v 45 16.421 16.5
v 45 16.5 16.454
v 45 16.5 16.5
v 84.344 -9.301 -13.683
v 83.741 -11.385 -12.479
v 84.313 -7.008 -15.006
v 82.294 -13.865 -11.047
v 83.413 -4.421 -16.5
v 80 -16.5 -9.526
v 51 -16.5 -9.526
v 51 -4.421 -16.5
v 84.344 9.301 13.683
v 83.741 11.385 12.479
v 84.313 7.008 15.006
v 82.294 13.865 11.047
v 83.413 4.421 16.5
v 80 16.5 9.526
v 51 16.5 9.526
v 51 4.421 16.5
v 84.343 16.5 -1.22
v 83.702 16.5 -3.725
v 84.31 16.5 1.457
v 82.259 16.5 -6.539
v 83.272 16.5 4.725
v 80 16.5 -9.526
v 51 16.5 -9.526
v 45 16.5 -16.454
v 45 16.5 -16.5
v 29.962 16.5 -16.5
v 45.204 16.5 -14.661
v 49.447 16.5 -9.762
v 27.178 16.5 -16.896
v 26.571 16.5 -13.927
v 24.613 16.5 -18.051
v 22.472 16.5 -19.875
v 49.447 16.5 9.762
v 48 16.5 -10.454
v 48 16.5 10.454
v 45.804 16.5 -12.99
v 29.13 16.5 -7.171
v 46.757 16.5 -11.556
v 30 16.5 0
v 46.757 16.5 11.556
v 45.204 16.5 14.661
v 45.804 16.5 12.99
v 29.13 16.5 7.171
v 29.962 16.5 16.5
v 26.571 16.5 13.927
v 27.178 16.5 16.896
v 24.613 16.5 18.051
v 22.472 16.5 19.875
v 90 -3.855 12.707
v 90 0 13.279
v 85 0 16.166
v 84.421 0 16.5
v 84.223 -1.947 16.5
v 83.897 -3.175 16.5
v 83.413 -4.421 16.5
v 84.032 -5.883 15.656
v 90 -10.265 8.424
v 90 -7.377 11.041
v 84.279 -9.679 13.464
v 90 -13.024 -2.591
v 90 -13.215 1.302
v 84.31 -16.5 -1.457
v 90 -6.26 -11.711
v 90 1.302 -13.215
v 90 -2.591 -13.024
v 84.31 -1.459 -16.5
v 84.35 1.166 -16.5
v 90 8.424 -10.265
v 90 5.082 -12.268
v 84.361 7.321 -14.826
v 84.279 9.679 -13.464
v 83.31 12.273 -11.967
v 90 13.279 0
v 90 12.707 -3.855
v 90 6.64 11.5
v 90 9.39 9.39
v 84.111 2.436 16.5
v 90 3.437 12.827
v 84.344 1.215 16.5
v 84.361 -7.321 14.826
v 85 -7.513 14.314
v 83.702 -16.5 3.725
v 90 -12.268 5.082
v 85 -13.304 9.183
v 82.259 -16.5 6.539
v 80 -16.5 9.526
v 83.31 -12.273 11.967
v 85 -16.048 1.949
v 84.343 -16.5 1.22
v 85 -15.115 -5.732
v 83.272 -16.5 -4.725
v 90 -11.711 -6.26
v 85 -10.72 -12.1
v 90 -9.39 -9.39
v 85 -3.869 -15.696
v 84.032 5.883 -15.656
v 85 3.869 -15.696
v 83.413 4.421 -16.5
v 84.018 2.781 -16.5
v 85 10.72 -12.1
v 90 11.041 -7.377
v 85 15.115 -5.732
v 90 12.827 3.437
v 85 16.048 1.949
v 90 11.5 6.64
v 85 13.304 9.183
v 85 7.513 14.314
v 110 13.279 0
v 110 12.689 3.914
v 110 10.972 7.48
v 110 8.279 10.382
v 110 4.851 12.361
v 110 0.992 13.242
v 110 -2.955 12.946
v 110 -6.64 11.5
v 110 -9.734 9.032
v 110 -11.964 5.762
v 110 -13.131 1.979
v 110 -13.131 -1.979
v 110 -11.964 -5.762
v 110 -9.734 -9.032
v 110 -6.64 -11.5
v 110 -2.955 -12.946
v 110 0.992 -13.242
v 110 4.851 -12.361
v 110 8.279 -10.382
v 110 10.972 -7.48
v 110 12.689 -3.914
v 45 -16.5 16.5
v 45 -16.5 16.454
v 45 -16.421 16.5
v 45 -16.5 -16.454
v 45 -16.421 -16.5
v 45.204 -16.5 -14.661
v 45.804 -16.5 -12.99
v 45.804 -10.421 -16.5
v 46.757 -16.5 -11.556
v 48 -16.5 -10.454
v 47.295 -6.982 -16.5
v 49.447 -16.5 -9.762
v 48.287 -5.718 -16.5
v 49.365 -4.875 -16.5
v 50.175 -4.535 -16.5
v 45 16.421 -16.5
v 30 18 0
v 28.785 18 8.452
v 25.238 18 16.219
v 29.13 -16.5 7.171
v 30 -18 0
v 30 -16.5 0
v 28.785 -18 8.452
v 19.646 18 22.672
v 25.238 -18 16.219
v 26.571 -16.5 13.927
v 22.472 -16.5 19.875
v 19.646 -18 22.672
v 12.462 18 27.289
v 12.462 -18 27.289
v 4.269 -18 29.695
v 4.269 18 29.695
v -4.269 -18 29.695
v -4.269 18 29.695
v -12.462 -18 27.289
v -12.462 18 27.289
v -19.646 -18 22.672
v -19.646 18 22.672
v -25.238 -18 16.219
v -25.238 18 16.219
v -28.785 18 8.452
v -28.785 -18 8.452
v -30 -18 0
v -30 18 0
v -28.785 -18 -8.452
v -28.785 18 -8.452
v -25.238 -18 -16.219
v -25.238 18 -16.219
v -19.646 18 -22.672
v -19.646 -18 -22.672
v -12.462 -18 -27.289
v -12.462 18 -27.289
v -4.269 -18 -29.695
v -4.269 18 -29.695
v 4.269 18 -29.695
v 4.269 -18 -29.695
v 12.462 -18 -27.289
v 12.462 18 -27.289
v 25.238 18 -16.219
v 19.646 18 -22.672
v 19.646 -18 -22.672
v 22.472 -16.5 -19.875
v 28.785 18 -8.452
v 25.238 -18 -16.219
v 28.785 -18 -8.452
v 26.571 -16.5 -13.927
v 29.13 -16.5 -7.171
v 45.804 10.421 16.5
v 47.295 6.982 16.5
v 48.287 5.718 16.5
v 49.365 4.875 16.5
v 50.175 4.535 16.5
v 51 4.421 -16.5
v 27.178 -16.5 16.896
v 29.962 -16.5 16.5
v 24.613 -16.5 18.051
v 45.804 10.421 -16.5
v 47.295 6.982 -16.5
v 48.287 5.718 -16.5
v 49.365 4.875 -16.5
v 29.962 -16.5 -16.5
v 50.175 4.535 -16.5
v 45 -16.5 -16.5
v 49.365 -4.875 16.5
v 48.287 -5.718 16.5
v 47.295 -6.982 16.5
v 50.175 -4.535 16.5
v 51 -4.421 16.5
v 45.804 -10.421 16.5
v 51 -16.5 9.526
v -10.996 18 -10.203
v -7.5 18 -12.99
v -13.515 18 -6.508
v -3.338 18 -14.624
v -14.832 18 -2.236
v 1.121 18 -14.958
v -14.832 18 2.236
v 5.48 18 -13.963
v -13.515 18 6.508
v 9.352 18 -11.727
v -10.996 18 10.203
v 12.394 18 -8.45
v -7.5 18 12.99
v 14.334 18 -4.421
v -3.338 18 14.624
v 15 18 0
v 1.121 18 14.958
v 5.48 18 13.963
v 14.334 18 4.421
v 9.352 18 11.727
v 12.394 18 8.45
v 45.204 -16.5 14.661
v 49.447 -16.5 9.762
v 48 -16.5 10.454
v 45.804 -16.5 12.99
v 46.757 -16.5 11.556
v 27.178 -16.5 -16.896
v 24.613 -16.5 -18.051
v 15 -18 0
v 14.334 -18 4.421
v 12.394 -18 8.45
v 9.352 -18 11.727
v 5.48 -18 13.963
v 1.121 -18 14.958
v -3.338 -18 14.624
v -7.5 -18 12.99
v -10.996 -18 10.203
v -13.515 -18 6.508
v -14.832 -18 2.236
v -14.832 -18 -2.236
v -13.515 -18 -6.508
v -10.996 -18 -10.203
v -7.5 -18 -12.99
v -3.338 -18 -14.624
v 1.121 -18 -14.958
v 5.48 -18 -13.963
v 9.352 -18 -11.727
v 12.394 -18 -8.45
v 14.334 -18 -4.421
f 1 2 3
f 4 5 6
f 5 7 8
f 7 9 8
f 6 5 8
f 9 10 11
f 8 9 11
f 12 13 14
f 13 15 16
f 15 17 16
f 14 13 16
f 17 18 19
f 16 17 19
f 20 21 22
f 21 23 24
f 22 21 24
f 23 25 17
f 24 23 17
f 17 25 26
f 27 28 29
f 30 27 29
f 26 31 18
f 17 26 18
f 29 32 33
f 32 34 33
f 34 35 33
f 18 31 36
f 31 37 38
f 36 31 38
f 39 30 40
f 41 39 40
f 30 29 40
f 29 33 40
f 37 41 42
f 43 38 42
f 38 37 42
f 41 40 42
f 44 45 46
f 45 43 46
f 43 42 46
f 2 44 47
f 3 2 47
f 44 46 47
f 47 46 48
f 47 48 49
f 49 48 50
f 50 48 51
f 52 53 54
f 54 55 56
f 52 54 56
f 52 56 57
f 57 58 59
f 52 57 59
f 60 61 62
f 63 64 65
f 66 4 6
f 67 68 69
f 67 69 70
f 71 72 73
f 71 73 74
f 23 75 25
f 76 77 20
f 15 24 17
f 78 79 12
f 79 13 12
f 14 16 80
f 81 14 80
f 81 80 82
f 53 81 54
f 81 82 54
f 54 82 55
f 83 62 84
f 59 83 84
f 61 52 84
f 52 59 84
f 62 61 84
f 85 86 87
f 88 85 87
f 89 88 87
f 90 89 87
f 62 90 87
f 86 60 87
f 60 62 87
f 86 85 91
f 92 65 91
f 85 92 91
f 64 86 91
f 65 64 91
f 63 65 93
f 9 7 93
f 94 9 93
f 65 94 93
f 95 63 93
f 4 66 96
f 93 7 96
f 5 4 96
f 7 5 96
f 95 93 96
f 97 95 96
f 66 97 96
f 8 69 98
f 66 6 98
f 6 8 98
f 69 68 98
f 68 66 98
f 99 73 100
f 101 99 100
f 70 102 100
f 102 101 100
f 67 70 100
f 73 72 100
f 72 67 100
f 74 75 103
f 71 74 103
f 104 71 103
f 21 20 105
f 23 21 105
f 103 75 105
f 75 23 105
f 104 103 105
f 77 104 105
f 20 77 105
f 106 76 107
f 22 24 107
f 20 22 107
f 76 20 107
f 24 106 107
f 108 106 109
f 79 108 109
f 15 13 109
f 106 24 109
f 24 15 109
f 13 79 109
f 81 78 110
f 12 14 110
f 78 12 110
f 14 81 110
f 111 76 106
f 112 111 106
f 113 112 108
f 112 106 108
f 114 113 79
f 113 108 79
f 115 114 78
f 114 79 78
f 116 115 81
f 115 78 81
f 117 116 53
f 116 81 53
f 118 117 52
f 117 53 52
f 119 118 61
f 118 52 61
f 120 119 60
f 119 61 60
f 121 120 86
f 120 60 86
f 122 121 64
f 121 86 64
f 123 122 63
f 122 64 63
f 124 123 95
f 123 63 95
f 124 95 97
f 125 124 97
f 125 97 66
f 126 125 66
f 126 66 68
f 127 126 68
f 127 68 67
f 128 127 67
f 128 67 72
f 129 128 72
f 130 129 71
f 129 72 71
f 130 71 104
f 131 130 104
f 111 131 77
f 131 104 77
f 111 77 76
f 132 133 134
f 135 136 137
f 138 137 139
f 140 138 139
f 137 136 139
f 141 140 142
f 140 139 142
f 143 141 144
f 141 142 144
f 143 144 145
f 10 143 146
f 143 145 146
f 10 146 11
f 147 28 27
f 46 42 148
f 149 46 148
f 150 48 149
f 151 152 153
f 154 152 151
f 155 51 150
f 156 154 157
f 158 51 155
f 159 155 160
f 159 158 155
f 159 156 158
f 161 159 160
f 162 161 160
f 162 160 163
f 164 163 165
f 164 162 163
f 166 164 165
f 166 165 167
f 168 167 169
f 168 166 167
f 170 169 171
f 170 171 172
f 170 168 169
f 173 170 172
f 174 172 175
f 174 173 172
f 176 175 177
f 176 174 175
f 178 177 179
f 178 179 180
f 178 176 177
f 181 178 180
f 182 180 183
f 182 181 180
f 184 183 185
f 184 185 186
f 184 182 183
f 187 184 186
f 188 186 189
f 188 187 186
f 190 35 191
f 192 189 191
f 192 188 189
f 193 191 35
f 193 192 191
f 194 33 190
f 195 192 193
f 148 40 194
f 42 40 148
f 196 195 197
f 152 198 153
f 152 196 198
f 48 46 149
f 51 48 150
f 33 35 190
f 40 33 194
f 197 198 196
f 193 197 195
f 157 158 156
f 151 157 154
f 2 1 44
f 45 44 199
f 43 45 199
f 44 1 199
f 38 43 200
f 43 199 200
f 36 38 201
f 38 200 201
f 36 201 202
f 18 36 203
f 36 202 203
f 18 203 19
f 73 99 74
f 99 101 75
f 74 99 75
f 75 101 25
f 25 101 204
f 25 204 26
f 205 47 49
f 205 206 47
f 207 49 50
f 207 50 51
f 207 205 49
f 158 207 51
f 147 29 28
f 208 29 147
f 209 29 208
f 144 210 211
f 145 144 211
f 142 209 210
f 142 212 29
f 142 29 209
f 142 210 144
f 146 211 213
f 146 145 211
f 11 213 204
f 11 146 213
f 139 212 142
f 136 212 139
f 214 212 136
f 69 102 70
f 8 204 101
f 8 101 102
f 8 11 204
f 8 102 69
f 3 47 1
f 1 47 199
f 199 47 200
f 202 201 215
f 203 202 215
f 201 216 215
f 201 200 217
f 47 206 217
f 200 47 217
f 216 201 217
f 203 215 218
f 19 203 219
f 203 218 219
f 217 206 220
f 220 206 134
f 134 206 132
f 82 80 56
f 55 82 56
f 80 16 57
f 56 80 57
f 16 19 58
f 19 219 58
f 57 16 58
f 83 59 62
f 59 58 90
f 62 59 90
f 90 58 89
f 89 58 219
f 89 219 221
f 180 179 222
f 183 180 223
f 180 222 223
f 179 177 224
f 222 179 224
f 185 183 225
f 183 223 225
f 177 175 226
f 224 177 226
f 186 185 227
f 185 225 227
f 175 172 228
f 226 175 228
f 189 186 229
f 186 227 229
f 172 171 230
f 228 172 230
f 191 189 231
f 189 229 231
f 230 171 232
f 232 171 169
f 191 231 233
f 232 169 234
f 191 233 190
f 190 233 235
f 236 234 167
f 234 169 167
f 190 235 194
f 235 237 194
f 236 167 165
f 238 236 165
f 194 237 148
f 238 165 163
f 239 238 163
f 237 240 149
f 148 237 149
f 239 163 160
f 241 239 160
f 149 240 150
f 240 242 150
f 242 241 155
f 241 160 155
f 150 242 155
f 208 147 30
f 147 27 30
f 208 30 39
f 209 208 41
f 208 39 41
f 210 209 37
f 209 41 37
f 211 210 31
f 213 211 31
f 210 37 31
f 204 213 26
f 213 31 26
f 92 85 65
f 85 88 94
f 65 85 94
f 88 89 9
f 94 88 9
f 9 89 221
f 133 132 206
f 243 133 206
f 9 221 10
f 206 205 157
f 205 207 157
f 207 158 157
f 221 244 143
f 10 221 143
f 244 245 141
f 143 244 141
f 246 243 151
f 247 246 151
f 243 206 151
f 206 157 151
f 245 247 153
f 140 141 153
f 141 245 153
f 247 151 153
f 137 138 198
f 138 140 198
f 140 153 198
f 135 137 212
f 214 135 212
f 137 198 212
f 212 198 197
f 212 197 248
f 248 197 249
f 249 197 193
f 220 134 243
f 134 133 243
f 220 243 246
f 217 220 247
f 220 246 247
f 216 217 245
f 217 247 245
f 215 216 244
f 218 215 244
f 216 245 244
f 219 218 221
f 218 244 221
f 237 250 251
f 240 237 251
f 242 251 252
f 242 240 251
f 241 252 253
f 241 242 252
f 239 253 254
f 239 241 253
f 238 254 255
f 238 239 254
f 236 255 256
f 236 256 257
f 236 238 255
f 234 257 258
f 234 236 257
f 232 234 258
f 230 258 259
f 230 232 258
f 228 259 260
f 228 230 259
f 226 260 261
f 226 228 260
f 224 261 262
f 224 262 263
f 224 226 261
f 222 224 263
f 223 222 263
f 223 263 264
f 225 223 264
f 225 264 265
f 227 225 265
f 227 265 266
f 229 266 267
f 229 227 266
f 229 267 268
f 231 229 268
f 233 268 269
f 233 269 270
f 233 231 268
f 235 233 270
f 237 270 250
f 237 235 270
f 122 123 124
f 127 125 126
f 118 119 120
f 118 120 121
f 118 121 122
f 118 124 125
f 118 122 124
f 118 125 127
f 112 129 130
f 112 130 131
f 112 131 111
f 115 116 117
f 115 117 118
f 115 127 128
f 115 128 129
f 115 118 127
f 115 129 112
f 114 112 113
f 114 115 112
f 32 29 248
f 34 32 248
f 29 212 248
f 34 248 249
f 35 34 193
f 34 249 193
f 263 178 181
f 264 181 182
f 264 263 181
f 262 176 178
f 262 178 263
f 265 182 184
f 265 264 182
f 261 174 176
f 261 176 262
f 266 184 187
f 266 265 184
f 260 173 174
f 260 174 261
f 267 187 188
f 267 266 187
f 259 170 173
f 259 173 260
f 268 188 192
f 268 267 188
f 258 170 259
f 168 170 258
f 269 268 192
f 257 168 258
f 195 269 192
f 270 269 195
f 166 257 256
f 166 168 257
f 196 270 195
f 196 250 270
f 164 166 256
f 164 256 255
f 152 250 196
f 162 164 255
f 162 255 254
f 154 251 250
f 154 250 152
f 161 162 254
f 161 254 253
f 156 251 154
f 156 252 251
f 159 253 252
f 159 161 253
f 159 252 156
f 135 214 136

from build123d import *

# Parameters (mm, degrees)
F0_R      = 30
F0_R_2    = 15
F1_DEPTH  = 18
F2_W      = 20
F2_H      = 33
F3_DEPTH  = 16.5
F5_DEPTH  = 45
F9_DEPTH  = 45.001
F10_DEPTH = 45.001
F11_R     = 6
F12_R     = 13.2790561914
F13_DEPTH = 20
F14_R     = 10


with BuildPart() as f1:
    # F0 (on Front) → F1 (new body, symmetric)
    with BuildSketch(Plane.XZ):
        Circle(F0_R)
        Circle(F0_R_2, mode=Mode.SUBTRACT)
    extrude(amount=F1_DEPTH, both=True)

    # F2 (on Front) → F3 (join, symmetric)
    with BuildSketch(Plane.XZ):
        with Locations((35, 0)):
            Rectangle(F2_W, F2_H)
    extrude(amount=F3_DEPTH, both=True)

    # F4 (on face) → F5 (join)
    with BuildSketch(Plane.YZ.offset(45)):
        Polygon((-16.5, 9.5262794416), (-16.5, -9.5262794416), (0, -19.0525588833), (16.5, -9.5262794416), (16.5, 9.5262794416), (0, 19.0525588833), align=None)
    extrude(amount=F5_DEPTH)

    # F7 (on mid) → F8 (revolve, cut)
    with BuildSketch(Plane(origin=(0, 0, 0), x_dir=(-1, 0, 0), z_dir=(0, 1, 0))):
        Polygon((-90, 19.0525588833), (-90, 13.2790561914), (-80, 19.0525588833), align=None)
    revolve(axis=Axis((76.7741315067, 0, 0), (1, 0, 0)), mode=Mode.SUBTRACT)

    # F9 (cut, through all): a face of the model
    f9_faces = [f1.faces().sort_by_distance(p)[0] for p in [
        (45, 0, 17.3508529611),
    ]]
    extrude(f9_faces, amount=-F9_DEPTH, mode=Mode.SUBTRACT)

    # F10 (cut, through all): a face of the model
    f10_faces = [f1.faces().sort_by_distance(p)[0] for p in [
        (45, 0, -17.3508529611),
    ]]
    extrude(f10_faces, amount=-F10_DEPTH, mode=Mode.SUBTRACT)

    # F11
    f11_edges = [f1.edges().sort_by_distance(p)[0] for p in [
        (45, -10.460581, -13.01314),
        (45, -10.460581, 13.01314),
        (45, 10.460581, 13.01314),
        (45, 10.460581, -13.01314),
    ]]
    fillet(f11_edges, radius=F11_R)

    # F12 (on face) → F13 (join)
    with BuildSketch(Plane.YZ.offset(90)):
        Circle(F12_R)
    extrude(amount=F13_DEPTH)

    # F14
    f14_edges = [f1.edges().sort_by_distance(p)[0] for p in [
        (25.05494, 0, 16.5),
        (25.05494, 0, -16.5),
    ]]
    fillet(f14_edges, radius=F14_R)


solid = f1.part
